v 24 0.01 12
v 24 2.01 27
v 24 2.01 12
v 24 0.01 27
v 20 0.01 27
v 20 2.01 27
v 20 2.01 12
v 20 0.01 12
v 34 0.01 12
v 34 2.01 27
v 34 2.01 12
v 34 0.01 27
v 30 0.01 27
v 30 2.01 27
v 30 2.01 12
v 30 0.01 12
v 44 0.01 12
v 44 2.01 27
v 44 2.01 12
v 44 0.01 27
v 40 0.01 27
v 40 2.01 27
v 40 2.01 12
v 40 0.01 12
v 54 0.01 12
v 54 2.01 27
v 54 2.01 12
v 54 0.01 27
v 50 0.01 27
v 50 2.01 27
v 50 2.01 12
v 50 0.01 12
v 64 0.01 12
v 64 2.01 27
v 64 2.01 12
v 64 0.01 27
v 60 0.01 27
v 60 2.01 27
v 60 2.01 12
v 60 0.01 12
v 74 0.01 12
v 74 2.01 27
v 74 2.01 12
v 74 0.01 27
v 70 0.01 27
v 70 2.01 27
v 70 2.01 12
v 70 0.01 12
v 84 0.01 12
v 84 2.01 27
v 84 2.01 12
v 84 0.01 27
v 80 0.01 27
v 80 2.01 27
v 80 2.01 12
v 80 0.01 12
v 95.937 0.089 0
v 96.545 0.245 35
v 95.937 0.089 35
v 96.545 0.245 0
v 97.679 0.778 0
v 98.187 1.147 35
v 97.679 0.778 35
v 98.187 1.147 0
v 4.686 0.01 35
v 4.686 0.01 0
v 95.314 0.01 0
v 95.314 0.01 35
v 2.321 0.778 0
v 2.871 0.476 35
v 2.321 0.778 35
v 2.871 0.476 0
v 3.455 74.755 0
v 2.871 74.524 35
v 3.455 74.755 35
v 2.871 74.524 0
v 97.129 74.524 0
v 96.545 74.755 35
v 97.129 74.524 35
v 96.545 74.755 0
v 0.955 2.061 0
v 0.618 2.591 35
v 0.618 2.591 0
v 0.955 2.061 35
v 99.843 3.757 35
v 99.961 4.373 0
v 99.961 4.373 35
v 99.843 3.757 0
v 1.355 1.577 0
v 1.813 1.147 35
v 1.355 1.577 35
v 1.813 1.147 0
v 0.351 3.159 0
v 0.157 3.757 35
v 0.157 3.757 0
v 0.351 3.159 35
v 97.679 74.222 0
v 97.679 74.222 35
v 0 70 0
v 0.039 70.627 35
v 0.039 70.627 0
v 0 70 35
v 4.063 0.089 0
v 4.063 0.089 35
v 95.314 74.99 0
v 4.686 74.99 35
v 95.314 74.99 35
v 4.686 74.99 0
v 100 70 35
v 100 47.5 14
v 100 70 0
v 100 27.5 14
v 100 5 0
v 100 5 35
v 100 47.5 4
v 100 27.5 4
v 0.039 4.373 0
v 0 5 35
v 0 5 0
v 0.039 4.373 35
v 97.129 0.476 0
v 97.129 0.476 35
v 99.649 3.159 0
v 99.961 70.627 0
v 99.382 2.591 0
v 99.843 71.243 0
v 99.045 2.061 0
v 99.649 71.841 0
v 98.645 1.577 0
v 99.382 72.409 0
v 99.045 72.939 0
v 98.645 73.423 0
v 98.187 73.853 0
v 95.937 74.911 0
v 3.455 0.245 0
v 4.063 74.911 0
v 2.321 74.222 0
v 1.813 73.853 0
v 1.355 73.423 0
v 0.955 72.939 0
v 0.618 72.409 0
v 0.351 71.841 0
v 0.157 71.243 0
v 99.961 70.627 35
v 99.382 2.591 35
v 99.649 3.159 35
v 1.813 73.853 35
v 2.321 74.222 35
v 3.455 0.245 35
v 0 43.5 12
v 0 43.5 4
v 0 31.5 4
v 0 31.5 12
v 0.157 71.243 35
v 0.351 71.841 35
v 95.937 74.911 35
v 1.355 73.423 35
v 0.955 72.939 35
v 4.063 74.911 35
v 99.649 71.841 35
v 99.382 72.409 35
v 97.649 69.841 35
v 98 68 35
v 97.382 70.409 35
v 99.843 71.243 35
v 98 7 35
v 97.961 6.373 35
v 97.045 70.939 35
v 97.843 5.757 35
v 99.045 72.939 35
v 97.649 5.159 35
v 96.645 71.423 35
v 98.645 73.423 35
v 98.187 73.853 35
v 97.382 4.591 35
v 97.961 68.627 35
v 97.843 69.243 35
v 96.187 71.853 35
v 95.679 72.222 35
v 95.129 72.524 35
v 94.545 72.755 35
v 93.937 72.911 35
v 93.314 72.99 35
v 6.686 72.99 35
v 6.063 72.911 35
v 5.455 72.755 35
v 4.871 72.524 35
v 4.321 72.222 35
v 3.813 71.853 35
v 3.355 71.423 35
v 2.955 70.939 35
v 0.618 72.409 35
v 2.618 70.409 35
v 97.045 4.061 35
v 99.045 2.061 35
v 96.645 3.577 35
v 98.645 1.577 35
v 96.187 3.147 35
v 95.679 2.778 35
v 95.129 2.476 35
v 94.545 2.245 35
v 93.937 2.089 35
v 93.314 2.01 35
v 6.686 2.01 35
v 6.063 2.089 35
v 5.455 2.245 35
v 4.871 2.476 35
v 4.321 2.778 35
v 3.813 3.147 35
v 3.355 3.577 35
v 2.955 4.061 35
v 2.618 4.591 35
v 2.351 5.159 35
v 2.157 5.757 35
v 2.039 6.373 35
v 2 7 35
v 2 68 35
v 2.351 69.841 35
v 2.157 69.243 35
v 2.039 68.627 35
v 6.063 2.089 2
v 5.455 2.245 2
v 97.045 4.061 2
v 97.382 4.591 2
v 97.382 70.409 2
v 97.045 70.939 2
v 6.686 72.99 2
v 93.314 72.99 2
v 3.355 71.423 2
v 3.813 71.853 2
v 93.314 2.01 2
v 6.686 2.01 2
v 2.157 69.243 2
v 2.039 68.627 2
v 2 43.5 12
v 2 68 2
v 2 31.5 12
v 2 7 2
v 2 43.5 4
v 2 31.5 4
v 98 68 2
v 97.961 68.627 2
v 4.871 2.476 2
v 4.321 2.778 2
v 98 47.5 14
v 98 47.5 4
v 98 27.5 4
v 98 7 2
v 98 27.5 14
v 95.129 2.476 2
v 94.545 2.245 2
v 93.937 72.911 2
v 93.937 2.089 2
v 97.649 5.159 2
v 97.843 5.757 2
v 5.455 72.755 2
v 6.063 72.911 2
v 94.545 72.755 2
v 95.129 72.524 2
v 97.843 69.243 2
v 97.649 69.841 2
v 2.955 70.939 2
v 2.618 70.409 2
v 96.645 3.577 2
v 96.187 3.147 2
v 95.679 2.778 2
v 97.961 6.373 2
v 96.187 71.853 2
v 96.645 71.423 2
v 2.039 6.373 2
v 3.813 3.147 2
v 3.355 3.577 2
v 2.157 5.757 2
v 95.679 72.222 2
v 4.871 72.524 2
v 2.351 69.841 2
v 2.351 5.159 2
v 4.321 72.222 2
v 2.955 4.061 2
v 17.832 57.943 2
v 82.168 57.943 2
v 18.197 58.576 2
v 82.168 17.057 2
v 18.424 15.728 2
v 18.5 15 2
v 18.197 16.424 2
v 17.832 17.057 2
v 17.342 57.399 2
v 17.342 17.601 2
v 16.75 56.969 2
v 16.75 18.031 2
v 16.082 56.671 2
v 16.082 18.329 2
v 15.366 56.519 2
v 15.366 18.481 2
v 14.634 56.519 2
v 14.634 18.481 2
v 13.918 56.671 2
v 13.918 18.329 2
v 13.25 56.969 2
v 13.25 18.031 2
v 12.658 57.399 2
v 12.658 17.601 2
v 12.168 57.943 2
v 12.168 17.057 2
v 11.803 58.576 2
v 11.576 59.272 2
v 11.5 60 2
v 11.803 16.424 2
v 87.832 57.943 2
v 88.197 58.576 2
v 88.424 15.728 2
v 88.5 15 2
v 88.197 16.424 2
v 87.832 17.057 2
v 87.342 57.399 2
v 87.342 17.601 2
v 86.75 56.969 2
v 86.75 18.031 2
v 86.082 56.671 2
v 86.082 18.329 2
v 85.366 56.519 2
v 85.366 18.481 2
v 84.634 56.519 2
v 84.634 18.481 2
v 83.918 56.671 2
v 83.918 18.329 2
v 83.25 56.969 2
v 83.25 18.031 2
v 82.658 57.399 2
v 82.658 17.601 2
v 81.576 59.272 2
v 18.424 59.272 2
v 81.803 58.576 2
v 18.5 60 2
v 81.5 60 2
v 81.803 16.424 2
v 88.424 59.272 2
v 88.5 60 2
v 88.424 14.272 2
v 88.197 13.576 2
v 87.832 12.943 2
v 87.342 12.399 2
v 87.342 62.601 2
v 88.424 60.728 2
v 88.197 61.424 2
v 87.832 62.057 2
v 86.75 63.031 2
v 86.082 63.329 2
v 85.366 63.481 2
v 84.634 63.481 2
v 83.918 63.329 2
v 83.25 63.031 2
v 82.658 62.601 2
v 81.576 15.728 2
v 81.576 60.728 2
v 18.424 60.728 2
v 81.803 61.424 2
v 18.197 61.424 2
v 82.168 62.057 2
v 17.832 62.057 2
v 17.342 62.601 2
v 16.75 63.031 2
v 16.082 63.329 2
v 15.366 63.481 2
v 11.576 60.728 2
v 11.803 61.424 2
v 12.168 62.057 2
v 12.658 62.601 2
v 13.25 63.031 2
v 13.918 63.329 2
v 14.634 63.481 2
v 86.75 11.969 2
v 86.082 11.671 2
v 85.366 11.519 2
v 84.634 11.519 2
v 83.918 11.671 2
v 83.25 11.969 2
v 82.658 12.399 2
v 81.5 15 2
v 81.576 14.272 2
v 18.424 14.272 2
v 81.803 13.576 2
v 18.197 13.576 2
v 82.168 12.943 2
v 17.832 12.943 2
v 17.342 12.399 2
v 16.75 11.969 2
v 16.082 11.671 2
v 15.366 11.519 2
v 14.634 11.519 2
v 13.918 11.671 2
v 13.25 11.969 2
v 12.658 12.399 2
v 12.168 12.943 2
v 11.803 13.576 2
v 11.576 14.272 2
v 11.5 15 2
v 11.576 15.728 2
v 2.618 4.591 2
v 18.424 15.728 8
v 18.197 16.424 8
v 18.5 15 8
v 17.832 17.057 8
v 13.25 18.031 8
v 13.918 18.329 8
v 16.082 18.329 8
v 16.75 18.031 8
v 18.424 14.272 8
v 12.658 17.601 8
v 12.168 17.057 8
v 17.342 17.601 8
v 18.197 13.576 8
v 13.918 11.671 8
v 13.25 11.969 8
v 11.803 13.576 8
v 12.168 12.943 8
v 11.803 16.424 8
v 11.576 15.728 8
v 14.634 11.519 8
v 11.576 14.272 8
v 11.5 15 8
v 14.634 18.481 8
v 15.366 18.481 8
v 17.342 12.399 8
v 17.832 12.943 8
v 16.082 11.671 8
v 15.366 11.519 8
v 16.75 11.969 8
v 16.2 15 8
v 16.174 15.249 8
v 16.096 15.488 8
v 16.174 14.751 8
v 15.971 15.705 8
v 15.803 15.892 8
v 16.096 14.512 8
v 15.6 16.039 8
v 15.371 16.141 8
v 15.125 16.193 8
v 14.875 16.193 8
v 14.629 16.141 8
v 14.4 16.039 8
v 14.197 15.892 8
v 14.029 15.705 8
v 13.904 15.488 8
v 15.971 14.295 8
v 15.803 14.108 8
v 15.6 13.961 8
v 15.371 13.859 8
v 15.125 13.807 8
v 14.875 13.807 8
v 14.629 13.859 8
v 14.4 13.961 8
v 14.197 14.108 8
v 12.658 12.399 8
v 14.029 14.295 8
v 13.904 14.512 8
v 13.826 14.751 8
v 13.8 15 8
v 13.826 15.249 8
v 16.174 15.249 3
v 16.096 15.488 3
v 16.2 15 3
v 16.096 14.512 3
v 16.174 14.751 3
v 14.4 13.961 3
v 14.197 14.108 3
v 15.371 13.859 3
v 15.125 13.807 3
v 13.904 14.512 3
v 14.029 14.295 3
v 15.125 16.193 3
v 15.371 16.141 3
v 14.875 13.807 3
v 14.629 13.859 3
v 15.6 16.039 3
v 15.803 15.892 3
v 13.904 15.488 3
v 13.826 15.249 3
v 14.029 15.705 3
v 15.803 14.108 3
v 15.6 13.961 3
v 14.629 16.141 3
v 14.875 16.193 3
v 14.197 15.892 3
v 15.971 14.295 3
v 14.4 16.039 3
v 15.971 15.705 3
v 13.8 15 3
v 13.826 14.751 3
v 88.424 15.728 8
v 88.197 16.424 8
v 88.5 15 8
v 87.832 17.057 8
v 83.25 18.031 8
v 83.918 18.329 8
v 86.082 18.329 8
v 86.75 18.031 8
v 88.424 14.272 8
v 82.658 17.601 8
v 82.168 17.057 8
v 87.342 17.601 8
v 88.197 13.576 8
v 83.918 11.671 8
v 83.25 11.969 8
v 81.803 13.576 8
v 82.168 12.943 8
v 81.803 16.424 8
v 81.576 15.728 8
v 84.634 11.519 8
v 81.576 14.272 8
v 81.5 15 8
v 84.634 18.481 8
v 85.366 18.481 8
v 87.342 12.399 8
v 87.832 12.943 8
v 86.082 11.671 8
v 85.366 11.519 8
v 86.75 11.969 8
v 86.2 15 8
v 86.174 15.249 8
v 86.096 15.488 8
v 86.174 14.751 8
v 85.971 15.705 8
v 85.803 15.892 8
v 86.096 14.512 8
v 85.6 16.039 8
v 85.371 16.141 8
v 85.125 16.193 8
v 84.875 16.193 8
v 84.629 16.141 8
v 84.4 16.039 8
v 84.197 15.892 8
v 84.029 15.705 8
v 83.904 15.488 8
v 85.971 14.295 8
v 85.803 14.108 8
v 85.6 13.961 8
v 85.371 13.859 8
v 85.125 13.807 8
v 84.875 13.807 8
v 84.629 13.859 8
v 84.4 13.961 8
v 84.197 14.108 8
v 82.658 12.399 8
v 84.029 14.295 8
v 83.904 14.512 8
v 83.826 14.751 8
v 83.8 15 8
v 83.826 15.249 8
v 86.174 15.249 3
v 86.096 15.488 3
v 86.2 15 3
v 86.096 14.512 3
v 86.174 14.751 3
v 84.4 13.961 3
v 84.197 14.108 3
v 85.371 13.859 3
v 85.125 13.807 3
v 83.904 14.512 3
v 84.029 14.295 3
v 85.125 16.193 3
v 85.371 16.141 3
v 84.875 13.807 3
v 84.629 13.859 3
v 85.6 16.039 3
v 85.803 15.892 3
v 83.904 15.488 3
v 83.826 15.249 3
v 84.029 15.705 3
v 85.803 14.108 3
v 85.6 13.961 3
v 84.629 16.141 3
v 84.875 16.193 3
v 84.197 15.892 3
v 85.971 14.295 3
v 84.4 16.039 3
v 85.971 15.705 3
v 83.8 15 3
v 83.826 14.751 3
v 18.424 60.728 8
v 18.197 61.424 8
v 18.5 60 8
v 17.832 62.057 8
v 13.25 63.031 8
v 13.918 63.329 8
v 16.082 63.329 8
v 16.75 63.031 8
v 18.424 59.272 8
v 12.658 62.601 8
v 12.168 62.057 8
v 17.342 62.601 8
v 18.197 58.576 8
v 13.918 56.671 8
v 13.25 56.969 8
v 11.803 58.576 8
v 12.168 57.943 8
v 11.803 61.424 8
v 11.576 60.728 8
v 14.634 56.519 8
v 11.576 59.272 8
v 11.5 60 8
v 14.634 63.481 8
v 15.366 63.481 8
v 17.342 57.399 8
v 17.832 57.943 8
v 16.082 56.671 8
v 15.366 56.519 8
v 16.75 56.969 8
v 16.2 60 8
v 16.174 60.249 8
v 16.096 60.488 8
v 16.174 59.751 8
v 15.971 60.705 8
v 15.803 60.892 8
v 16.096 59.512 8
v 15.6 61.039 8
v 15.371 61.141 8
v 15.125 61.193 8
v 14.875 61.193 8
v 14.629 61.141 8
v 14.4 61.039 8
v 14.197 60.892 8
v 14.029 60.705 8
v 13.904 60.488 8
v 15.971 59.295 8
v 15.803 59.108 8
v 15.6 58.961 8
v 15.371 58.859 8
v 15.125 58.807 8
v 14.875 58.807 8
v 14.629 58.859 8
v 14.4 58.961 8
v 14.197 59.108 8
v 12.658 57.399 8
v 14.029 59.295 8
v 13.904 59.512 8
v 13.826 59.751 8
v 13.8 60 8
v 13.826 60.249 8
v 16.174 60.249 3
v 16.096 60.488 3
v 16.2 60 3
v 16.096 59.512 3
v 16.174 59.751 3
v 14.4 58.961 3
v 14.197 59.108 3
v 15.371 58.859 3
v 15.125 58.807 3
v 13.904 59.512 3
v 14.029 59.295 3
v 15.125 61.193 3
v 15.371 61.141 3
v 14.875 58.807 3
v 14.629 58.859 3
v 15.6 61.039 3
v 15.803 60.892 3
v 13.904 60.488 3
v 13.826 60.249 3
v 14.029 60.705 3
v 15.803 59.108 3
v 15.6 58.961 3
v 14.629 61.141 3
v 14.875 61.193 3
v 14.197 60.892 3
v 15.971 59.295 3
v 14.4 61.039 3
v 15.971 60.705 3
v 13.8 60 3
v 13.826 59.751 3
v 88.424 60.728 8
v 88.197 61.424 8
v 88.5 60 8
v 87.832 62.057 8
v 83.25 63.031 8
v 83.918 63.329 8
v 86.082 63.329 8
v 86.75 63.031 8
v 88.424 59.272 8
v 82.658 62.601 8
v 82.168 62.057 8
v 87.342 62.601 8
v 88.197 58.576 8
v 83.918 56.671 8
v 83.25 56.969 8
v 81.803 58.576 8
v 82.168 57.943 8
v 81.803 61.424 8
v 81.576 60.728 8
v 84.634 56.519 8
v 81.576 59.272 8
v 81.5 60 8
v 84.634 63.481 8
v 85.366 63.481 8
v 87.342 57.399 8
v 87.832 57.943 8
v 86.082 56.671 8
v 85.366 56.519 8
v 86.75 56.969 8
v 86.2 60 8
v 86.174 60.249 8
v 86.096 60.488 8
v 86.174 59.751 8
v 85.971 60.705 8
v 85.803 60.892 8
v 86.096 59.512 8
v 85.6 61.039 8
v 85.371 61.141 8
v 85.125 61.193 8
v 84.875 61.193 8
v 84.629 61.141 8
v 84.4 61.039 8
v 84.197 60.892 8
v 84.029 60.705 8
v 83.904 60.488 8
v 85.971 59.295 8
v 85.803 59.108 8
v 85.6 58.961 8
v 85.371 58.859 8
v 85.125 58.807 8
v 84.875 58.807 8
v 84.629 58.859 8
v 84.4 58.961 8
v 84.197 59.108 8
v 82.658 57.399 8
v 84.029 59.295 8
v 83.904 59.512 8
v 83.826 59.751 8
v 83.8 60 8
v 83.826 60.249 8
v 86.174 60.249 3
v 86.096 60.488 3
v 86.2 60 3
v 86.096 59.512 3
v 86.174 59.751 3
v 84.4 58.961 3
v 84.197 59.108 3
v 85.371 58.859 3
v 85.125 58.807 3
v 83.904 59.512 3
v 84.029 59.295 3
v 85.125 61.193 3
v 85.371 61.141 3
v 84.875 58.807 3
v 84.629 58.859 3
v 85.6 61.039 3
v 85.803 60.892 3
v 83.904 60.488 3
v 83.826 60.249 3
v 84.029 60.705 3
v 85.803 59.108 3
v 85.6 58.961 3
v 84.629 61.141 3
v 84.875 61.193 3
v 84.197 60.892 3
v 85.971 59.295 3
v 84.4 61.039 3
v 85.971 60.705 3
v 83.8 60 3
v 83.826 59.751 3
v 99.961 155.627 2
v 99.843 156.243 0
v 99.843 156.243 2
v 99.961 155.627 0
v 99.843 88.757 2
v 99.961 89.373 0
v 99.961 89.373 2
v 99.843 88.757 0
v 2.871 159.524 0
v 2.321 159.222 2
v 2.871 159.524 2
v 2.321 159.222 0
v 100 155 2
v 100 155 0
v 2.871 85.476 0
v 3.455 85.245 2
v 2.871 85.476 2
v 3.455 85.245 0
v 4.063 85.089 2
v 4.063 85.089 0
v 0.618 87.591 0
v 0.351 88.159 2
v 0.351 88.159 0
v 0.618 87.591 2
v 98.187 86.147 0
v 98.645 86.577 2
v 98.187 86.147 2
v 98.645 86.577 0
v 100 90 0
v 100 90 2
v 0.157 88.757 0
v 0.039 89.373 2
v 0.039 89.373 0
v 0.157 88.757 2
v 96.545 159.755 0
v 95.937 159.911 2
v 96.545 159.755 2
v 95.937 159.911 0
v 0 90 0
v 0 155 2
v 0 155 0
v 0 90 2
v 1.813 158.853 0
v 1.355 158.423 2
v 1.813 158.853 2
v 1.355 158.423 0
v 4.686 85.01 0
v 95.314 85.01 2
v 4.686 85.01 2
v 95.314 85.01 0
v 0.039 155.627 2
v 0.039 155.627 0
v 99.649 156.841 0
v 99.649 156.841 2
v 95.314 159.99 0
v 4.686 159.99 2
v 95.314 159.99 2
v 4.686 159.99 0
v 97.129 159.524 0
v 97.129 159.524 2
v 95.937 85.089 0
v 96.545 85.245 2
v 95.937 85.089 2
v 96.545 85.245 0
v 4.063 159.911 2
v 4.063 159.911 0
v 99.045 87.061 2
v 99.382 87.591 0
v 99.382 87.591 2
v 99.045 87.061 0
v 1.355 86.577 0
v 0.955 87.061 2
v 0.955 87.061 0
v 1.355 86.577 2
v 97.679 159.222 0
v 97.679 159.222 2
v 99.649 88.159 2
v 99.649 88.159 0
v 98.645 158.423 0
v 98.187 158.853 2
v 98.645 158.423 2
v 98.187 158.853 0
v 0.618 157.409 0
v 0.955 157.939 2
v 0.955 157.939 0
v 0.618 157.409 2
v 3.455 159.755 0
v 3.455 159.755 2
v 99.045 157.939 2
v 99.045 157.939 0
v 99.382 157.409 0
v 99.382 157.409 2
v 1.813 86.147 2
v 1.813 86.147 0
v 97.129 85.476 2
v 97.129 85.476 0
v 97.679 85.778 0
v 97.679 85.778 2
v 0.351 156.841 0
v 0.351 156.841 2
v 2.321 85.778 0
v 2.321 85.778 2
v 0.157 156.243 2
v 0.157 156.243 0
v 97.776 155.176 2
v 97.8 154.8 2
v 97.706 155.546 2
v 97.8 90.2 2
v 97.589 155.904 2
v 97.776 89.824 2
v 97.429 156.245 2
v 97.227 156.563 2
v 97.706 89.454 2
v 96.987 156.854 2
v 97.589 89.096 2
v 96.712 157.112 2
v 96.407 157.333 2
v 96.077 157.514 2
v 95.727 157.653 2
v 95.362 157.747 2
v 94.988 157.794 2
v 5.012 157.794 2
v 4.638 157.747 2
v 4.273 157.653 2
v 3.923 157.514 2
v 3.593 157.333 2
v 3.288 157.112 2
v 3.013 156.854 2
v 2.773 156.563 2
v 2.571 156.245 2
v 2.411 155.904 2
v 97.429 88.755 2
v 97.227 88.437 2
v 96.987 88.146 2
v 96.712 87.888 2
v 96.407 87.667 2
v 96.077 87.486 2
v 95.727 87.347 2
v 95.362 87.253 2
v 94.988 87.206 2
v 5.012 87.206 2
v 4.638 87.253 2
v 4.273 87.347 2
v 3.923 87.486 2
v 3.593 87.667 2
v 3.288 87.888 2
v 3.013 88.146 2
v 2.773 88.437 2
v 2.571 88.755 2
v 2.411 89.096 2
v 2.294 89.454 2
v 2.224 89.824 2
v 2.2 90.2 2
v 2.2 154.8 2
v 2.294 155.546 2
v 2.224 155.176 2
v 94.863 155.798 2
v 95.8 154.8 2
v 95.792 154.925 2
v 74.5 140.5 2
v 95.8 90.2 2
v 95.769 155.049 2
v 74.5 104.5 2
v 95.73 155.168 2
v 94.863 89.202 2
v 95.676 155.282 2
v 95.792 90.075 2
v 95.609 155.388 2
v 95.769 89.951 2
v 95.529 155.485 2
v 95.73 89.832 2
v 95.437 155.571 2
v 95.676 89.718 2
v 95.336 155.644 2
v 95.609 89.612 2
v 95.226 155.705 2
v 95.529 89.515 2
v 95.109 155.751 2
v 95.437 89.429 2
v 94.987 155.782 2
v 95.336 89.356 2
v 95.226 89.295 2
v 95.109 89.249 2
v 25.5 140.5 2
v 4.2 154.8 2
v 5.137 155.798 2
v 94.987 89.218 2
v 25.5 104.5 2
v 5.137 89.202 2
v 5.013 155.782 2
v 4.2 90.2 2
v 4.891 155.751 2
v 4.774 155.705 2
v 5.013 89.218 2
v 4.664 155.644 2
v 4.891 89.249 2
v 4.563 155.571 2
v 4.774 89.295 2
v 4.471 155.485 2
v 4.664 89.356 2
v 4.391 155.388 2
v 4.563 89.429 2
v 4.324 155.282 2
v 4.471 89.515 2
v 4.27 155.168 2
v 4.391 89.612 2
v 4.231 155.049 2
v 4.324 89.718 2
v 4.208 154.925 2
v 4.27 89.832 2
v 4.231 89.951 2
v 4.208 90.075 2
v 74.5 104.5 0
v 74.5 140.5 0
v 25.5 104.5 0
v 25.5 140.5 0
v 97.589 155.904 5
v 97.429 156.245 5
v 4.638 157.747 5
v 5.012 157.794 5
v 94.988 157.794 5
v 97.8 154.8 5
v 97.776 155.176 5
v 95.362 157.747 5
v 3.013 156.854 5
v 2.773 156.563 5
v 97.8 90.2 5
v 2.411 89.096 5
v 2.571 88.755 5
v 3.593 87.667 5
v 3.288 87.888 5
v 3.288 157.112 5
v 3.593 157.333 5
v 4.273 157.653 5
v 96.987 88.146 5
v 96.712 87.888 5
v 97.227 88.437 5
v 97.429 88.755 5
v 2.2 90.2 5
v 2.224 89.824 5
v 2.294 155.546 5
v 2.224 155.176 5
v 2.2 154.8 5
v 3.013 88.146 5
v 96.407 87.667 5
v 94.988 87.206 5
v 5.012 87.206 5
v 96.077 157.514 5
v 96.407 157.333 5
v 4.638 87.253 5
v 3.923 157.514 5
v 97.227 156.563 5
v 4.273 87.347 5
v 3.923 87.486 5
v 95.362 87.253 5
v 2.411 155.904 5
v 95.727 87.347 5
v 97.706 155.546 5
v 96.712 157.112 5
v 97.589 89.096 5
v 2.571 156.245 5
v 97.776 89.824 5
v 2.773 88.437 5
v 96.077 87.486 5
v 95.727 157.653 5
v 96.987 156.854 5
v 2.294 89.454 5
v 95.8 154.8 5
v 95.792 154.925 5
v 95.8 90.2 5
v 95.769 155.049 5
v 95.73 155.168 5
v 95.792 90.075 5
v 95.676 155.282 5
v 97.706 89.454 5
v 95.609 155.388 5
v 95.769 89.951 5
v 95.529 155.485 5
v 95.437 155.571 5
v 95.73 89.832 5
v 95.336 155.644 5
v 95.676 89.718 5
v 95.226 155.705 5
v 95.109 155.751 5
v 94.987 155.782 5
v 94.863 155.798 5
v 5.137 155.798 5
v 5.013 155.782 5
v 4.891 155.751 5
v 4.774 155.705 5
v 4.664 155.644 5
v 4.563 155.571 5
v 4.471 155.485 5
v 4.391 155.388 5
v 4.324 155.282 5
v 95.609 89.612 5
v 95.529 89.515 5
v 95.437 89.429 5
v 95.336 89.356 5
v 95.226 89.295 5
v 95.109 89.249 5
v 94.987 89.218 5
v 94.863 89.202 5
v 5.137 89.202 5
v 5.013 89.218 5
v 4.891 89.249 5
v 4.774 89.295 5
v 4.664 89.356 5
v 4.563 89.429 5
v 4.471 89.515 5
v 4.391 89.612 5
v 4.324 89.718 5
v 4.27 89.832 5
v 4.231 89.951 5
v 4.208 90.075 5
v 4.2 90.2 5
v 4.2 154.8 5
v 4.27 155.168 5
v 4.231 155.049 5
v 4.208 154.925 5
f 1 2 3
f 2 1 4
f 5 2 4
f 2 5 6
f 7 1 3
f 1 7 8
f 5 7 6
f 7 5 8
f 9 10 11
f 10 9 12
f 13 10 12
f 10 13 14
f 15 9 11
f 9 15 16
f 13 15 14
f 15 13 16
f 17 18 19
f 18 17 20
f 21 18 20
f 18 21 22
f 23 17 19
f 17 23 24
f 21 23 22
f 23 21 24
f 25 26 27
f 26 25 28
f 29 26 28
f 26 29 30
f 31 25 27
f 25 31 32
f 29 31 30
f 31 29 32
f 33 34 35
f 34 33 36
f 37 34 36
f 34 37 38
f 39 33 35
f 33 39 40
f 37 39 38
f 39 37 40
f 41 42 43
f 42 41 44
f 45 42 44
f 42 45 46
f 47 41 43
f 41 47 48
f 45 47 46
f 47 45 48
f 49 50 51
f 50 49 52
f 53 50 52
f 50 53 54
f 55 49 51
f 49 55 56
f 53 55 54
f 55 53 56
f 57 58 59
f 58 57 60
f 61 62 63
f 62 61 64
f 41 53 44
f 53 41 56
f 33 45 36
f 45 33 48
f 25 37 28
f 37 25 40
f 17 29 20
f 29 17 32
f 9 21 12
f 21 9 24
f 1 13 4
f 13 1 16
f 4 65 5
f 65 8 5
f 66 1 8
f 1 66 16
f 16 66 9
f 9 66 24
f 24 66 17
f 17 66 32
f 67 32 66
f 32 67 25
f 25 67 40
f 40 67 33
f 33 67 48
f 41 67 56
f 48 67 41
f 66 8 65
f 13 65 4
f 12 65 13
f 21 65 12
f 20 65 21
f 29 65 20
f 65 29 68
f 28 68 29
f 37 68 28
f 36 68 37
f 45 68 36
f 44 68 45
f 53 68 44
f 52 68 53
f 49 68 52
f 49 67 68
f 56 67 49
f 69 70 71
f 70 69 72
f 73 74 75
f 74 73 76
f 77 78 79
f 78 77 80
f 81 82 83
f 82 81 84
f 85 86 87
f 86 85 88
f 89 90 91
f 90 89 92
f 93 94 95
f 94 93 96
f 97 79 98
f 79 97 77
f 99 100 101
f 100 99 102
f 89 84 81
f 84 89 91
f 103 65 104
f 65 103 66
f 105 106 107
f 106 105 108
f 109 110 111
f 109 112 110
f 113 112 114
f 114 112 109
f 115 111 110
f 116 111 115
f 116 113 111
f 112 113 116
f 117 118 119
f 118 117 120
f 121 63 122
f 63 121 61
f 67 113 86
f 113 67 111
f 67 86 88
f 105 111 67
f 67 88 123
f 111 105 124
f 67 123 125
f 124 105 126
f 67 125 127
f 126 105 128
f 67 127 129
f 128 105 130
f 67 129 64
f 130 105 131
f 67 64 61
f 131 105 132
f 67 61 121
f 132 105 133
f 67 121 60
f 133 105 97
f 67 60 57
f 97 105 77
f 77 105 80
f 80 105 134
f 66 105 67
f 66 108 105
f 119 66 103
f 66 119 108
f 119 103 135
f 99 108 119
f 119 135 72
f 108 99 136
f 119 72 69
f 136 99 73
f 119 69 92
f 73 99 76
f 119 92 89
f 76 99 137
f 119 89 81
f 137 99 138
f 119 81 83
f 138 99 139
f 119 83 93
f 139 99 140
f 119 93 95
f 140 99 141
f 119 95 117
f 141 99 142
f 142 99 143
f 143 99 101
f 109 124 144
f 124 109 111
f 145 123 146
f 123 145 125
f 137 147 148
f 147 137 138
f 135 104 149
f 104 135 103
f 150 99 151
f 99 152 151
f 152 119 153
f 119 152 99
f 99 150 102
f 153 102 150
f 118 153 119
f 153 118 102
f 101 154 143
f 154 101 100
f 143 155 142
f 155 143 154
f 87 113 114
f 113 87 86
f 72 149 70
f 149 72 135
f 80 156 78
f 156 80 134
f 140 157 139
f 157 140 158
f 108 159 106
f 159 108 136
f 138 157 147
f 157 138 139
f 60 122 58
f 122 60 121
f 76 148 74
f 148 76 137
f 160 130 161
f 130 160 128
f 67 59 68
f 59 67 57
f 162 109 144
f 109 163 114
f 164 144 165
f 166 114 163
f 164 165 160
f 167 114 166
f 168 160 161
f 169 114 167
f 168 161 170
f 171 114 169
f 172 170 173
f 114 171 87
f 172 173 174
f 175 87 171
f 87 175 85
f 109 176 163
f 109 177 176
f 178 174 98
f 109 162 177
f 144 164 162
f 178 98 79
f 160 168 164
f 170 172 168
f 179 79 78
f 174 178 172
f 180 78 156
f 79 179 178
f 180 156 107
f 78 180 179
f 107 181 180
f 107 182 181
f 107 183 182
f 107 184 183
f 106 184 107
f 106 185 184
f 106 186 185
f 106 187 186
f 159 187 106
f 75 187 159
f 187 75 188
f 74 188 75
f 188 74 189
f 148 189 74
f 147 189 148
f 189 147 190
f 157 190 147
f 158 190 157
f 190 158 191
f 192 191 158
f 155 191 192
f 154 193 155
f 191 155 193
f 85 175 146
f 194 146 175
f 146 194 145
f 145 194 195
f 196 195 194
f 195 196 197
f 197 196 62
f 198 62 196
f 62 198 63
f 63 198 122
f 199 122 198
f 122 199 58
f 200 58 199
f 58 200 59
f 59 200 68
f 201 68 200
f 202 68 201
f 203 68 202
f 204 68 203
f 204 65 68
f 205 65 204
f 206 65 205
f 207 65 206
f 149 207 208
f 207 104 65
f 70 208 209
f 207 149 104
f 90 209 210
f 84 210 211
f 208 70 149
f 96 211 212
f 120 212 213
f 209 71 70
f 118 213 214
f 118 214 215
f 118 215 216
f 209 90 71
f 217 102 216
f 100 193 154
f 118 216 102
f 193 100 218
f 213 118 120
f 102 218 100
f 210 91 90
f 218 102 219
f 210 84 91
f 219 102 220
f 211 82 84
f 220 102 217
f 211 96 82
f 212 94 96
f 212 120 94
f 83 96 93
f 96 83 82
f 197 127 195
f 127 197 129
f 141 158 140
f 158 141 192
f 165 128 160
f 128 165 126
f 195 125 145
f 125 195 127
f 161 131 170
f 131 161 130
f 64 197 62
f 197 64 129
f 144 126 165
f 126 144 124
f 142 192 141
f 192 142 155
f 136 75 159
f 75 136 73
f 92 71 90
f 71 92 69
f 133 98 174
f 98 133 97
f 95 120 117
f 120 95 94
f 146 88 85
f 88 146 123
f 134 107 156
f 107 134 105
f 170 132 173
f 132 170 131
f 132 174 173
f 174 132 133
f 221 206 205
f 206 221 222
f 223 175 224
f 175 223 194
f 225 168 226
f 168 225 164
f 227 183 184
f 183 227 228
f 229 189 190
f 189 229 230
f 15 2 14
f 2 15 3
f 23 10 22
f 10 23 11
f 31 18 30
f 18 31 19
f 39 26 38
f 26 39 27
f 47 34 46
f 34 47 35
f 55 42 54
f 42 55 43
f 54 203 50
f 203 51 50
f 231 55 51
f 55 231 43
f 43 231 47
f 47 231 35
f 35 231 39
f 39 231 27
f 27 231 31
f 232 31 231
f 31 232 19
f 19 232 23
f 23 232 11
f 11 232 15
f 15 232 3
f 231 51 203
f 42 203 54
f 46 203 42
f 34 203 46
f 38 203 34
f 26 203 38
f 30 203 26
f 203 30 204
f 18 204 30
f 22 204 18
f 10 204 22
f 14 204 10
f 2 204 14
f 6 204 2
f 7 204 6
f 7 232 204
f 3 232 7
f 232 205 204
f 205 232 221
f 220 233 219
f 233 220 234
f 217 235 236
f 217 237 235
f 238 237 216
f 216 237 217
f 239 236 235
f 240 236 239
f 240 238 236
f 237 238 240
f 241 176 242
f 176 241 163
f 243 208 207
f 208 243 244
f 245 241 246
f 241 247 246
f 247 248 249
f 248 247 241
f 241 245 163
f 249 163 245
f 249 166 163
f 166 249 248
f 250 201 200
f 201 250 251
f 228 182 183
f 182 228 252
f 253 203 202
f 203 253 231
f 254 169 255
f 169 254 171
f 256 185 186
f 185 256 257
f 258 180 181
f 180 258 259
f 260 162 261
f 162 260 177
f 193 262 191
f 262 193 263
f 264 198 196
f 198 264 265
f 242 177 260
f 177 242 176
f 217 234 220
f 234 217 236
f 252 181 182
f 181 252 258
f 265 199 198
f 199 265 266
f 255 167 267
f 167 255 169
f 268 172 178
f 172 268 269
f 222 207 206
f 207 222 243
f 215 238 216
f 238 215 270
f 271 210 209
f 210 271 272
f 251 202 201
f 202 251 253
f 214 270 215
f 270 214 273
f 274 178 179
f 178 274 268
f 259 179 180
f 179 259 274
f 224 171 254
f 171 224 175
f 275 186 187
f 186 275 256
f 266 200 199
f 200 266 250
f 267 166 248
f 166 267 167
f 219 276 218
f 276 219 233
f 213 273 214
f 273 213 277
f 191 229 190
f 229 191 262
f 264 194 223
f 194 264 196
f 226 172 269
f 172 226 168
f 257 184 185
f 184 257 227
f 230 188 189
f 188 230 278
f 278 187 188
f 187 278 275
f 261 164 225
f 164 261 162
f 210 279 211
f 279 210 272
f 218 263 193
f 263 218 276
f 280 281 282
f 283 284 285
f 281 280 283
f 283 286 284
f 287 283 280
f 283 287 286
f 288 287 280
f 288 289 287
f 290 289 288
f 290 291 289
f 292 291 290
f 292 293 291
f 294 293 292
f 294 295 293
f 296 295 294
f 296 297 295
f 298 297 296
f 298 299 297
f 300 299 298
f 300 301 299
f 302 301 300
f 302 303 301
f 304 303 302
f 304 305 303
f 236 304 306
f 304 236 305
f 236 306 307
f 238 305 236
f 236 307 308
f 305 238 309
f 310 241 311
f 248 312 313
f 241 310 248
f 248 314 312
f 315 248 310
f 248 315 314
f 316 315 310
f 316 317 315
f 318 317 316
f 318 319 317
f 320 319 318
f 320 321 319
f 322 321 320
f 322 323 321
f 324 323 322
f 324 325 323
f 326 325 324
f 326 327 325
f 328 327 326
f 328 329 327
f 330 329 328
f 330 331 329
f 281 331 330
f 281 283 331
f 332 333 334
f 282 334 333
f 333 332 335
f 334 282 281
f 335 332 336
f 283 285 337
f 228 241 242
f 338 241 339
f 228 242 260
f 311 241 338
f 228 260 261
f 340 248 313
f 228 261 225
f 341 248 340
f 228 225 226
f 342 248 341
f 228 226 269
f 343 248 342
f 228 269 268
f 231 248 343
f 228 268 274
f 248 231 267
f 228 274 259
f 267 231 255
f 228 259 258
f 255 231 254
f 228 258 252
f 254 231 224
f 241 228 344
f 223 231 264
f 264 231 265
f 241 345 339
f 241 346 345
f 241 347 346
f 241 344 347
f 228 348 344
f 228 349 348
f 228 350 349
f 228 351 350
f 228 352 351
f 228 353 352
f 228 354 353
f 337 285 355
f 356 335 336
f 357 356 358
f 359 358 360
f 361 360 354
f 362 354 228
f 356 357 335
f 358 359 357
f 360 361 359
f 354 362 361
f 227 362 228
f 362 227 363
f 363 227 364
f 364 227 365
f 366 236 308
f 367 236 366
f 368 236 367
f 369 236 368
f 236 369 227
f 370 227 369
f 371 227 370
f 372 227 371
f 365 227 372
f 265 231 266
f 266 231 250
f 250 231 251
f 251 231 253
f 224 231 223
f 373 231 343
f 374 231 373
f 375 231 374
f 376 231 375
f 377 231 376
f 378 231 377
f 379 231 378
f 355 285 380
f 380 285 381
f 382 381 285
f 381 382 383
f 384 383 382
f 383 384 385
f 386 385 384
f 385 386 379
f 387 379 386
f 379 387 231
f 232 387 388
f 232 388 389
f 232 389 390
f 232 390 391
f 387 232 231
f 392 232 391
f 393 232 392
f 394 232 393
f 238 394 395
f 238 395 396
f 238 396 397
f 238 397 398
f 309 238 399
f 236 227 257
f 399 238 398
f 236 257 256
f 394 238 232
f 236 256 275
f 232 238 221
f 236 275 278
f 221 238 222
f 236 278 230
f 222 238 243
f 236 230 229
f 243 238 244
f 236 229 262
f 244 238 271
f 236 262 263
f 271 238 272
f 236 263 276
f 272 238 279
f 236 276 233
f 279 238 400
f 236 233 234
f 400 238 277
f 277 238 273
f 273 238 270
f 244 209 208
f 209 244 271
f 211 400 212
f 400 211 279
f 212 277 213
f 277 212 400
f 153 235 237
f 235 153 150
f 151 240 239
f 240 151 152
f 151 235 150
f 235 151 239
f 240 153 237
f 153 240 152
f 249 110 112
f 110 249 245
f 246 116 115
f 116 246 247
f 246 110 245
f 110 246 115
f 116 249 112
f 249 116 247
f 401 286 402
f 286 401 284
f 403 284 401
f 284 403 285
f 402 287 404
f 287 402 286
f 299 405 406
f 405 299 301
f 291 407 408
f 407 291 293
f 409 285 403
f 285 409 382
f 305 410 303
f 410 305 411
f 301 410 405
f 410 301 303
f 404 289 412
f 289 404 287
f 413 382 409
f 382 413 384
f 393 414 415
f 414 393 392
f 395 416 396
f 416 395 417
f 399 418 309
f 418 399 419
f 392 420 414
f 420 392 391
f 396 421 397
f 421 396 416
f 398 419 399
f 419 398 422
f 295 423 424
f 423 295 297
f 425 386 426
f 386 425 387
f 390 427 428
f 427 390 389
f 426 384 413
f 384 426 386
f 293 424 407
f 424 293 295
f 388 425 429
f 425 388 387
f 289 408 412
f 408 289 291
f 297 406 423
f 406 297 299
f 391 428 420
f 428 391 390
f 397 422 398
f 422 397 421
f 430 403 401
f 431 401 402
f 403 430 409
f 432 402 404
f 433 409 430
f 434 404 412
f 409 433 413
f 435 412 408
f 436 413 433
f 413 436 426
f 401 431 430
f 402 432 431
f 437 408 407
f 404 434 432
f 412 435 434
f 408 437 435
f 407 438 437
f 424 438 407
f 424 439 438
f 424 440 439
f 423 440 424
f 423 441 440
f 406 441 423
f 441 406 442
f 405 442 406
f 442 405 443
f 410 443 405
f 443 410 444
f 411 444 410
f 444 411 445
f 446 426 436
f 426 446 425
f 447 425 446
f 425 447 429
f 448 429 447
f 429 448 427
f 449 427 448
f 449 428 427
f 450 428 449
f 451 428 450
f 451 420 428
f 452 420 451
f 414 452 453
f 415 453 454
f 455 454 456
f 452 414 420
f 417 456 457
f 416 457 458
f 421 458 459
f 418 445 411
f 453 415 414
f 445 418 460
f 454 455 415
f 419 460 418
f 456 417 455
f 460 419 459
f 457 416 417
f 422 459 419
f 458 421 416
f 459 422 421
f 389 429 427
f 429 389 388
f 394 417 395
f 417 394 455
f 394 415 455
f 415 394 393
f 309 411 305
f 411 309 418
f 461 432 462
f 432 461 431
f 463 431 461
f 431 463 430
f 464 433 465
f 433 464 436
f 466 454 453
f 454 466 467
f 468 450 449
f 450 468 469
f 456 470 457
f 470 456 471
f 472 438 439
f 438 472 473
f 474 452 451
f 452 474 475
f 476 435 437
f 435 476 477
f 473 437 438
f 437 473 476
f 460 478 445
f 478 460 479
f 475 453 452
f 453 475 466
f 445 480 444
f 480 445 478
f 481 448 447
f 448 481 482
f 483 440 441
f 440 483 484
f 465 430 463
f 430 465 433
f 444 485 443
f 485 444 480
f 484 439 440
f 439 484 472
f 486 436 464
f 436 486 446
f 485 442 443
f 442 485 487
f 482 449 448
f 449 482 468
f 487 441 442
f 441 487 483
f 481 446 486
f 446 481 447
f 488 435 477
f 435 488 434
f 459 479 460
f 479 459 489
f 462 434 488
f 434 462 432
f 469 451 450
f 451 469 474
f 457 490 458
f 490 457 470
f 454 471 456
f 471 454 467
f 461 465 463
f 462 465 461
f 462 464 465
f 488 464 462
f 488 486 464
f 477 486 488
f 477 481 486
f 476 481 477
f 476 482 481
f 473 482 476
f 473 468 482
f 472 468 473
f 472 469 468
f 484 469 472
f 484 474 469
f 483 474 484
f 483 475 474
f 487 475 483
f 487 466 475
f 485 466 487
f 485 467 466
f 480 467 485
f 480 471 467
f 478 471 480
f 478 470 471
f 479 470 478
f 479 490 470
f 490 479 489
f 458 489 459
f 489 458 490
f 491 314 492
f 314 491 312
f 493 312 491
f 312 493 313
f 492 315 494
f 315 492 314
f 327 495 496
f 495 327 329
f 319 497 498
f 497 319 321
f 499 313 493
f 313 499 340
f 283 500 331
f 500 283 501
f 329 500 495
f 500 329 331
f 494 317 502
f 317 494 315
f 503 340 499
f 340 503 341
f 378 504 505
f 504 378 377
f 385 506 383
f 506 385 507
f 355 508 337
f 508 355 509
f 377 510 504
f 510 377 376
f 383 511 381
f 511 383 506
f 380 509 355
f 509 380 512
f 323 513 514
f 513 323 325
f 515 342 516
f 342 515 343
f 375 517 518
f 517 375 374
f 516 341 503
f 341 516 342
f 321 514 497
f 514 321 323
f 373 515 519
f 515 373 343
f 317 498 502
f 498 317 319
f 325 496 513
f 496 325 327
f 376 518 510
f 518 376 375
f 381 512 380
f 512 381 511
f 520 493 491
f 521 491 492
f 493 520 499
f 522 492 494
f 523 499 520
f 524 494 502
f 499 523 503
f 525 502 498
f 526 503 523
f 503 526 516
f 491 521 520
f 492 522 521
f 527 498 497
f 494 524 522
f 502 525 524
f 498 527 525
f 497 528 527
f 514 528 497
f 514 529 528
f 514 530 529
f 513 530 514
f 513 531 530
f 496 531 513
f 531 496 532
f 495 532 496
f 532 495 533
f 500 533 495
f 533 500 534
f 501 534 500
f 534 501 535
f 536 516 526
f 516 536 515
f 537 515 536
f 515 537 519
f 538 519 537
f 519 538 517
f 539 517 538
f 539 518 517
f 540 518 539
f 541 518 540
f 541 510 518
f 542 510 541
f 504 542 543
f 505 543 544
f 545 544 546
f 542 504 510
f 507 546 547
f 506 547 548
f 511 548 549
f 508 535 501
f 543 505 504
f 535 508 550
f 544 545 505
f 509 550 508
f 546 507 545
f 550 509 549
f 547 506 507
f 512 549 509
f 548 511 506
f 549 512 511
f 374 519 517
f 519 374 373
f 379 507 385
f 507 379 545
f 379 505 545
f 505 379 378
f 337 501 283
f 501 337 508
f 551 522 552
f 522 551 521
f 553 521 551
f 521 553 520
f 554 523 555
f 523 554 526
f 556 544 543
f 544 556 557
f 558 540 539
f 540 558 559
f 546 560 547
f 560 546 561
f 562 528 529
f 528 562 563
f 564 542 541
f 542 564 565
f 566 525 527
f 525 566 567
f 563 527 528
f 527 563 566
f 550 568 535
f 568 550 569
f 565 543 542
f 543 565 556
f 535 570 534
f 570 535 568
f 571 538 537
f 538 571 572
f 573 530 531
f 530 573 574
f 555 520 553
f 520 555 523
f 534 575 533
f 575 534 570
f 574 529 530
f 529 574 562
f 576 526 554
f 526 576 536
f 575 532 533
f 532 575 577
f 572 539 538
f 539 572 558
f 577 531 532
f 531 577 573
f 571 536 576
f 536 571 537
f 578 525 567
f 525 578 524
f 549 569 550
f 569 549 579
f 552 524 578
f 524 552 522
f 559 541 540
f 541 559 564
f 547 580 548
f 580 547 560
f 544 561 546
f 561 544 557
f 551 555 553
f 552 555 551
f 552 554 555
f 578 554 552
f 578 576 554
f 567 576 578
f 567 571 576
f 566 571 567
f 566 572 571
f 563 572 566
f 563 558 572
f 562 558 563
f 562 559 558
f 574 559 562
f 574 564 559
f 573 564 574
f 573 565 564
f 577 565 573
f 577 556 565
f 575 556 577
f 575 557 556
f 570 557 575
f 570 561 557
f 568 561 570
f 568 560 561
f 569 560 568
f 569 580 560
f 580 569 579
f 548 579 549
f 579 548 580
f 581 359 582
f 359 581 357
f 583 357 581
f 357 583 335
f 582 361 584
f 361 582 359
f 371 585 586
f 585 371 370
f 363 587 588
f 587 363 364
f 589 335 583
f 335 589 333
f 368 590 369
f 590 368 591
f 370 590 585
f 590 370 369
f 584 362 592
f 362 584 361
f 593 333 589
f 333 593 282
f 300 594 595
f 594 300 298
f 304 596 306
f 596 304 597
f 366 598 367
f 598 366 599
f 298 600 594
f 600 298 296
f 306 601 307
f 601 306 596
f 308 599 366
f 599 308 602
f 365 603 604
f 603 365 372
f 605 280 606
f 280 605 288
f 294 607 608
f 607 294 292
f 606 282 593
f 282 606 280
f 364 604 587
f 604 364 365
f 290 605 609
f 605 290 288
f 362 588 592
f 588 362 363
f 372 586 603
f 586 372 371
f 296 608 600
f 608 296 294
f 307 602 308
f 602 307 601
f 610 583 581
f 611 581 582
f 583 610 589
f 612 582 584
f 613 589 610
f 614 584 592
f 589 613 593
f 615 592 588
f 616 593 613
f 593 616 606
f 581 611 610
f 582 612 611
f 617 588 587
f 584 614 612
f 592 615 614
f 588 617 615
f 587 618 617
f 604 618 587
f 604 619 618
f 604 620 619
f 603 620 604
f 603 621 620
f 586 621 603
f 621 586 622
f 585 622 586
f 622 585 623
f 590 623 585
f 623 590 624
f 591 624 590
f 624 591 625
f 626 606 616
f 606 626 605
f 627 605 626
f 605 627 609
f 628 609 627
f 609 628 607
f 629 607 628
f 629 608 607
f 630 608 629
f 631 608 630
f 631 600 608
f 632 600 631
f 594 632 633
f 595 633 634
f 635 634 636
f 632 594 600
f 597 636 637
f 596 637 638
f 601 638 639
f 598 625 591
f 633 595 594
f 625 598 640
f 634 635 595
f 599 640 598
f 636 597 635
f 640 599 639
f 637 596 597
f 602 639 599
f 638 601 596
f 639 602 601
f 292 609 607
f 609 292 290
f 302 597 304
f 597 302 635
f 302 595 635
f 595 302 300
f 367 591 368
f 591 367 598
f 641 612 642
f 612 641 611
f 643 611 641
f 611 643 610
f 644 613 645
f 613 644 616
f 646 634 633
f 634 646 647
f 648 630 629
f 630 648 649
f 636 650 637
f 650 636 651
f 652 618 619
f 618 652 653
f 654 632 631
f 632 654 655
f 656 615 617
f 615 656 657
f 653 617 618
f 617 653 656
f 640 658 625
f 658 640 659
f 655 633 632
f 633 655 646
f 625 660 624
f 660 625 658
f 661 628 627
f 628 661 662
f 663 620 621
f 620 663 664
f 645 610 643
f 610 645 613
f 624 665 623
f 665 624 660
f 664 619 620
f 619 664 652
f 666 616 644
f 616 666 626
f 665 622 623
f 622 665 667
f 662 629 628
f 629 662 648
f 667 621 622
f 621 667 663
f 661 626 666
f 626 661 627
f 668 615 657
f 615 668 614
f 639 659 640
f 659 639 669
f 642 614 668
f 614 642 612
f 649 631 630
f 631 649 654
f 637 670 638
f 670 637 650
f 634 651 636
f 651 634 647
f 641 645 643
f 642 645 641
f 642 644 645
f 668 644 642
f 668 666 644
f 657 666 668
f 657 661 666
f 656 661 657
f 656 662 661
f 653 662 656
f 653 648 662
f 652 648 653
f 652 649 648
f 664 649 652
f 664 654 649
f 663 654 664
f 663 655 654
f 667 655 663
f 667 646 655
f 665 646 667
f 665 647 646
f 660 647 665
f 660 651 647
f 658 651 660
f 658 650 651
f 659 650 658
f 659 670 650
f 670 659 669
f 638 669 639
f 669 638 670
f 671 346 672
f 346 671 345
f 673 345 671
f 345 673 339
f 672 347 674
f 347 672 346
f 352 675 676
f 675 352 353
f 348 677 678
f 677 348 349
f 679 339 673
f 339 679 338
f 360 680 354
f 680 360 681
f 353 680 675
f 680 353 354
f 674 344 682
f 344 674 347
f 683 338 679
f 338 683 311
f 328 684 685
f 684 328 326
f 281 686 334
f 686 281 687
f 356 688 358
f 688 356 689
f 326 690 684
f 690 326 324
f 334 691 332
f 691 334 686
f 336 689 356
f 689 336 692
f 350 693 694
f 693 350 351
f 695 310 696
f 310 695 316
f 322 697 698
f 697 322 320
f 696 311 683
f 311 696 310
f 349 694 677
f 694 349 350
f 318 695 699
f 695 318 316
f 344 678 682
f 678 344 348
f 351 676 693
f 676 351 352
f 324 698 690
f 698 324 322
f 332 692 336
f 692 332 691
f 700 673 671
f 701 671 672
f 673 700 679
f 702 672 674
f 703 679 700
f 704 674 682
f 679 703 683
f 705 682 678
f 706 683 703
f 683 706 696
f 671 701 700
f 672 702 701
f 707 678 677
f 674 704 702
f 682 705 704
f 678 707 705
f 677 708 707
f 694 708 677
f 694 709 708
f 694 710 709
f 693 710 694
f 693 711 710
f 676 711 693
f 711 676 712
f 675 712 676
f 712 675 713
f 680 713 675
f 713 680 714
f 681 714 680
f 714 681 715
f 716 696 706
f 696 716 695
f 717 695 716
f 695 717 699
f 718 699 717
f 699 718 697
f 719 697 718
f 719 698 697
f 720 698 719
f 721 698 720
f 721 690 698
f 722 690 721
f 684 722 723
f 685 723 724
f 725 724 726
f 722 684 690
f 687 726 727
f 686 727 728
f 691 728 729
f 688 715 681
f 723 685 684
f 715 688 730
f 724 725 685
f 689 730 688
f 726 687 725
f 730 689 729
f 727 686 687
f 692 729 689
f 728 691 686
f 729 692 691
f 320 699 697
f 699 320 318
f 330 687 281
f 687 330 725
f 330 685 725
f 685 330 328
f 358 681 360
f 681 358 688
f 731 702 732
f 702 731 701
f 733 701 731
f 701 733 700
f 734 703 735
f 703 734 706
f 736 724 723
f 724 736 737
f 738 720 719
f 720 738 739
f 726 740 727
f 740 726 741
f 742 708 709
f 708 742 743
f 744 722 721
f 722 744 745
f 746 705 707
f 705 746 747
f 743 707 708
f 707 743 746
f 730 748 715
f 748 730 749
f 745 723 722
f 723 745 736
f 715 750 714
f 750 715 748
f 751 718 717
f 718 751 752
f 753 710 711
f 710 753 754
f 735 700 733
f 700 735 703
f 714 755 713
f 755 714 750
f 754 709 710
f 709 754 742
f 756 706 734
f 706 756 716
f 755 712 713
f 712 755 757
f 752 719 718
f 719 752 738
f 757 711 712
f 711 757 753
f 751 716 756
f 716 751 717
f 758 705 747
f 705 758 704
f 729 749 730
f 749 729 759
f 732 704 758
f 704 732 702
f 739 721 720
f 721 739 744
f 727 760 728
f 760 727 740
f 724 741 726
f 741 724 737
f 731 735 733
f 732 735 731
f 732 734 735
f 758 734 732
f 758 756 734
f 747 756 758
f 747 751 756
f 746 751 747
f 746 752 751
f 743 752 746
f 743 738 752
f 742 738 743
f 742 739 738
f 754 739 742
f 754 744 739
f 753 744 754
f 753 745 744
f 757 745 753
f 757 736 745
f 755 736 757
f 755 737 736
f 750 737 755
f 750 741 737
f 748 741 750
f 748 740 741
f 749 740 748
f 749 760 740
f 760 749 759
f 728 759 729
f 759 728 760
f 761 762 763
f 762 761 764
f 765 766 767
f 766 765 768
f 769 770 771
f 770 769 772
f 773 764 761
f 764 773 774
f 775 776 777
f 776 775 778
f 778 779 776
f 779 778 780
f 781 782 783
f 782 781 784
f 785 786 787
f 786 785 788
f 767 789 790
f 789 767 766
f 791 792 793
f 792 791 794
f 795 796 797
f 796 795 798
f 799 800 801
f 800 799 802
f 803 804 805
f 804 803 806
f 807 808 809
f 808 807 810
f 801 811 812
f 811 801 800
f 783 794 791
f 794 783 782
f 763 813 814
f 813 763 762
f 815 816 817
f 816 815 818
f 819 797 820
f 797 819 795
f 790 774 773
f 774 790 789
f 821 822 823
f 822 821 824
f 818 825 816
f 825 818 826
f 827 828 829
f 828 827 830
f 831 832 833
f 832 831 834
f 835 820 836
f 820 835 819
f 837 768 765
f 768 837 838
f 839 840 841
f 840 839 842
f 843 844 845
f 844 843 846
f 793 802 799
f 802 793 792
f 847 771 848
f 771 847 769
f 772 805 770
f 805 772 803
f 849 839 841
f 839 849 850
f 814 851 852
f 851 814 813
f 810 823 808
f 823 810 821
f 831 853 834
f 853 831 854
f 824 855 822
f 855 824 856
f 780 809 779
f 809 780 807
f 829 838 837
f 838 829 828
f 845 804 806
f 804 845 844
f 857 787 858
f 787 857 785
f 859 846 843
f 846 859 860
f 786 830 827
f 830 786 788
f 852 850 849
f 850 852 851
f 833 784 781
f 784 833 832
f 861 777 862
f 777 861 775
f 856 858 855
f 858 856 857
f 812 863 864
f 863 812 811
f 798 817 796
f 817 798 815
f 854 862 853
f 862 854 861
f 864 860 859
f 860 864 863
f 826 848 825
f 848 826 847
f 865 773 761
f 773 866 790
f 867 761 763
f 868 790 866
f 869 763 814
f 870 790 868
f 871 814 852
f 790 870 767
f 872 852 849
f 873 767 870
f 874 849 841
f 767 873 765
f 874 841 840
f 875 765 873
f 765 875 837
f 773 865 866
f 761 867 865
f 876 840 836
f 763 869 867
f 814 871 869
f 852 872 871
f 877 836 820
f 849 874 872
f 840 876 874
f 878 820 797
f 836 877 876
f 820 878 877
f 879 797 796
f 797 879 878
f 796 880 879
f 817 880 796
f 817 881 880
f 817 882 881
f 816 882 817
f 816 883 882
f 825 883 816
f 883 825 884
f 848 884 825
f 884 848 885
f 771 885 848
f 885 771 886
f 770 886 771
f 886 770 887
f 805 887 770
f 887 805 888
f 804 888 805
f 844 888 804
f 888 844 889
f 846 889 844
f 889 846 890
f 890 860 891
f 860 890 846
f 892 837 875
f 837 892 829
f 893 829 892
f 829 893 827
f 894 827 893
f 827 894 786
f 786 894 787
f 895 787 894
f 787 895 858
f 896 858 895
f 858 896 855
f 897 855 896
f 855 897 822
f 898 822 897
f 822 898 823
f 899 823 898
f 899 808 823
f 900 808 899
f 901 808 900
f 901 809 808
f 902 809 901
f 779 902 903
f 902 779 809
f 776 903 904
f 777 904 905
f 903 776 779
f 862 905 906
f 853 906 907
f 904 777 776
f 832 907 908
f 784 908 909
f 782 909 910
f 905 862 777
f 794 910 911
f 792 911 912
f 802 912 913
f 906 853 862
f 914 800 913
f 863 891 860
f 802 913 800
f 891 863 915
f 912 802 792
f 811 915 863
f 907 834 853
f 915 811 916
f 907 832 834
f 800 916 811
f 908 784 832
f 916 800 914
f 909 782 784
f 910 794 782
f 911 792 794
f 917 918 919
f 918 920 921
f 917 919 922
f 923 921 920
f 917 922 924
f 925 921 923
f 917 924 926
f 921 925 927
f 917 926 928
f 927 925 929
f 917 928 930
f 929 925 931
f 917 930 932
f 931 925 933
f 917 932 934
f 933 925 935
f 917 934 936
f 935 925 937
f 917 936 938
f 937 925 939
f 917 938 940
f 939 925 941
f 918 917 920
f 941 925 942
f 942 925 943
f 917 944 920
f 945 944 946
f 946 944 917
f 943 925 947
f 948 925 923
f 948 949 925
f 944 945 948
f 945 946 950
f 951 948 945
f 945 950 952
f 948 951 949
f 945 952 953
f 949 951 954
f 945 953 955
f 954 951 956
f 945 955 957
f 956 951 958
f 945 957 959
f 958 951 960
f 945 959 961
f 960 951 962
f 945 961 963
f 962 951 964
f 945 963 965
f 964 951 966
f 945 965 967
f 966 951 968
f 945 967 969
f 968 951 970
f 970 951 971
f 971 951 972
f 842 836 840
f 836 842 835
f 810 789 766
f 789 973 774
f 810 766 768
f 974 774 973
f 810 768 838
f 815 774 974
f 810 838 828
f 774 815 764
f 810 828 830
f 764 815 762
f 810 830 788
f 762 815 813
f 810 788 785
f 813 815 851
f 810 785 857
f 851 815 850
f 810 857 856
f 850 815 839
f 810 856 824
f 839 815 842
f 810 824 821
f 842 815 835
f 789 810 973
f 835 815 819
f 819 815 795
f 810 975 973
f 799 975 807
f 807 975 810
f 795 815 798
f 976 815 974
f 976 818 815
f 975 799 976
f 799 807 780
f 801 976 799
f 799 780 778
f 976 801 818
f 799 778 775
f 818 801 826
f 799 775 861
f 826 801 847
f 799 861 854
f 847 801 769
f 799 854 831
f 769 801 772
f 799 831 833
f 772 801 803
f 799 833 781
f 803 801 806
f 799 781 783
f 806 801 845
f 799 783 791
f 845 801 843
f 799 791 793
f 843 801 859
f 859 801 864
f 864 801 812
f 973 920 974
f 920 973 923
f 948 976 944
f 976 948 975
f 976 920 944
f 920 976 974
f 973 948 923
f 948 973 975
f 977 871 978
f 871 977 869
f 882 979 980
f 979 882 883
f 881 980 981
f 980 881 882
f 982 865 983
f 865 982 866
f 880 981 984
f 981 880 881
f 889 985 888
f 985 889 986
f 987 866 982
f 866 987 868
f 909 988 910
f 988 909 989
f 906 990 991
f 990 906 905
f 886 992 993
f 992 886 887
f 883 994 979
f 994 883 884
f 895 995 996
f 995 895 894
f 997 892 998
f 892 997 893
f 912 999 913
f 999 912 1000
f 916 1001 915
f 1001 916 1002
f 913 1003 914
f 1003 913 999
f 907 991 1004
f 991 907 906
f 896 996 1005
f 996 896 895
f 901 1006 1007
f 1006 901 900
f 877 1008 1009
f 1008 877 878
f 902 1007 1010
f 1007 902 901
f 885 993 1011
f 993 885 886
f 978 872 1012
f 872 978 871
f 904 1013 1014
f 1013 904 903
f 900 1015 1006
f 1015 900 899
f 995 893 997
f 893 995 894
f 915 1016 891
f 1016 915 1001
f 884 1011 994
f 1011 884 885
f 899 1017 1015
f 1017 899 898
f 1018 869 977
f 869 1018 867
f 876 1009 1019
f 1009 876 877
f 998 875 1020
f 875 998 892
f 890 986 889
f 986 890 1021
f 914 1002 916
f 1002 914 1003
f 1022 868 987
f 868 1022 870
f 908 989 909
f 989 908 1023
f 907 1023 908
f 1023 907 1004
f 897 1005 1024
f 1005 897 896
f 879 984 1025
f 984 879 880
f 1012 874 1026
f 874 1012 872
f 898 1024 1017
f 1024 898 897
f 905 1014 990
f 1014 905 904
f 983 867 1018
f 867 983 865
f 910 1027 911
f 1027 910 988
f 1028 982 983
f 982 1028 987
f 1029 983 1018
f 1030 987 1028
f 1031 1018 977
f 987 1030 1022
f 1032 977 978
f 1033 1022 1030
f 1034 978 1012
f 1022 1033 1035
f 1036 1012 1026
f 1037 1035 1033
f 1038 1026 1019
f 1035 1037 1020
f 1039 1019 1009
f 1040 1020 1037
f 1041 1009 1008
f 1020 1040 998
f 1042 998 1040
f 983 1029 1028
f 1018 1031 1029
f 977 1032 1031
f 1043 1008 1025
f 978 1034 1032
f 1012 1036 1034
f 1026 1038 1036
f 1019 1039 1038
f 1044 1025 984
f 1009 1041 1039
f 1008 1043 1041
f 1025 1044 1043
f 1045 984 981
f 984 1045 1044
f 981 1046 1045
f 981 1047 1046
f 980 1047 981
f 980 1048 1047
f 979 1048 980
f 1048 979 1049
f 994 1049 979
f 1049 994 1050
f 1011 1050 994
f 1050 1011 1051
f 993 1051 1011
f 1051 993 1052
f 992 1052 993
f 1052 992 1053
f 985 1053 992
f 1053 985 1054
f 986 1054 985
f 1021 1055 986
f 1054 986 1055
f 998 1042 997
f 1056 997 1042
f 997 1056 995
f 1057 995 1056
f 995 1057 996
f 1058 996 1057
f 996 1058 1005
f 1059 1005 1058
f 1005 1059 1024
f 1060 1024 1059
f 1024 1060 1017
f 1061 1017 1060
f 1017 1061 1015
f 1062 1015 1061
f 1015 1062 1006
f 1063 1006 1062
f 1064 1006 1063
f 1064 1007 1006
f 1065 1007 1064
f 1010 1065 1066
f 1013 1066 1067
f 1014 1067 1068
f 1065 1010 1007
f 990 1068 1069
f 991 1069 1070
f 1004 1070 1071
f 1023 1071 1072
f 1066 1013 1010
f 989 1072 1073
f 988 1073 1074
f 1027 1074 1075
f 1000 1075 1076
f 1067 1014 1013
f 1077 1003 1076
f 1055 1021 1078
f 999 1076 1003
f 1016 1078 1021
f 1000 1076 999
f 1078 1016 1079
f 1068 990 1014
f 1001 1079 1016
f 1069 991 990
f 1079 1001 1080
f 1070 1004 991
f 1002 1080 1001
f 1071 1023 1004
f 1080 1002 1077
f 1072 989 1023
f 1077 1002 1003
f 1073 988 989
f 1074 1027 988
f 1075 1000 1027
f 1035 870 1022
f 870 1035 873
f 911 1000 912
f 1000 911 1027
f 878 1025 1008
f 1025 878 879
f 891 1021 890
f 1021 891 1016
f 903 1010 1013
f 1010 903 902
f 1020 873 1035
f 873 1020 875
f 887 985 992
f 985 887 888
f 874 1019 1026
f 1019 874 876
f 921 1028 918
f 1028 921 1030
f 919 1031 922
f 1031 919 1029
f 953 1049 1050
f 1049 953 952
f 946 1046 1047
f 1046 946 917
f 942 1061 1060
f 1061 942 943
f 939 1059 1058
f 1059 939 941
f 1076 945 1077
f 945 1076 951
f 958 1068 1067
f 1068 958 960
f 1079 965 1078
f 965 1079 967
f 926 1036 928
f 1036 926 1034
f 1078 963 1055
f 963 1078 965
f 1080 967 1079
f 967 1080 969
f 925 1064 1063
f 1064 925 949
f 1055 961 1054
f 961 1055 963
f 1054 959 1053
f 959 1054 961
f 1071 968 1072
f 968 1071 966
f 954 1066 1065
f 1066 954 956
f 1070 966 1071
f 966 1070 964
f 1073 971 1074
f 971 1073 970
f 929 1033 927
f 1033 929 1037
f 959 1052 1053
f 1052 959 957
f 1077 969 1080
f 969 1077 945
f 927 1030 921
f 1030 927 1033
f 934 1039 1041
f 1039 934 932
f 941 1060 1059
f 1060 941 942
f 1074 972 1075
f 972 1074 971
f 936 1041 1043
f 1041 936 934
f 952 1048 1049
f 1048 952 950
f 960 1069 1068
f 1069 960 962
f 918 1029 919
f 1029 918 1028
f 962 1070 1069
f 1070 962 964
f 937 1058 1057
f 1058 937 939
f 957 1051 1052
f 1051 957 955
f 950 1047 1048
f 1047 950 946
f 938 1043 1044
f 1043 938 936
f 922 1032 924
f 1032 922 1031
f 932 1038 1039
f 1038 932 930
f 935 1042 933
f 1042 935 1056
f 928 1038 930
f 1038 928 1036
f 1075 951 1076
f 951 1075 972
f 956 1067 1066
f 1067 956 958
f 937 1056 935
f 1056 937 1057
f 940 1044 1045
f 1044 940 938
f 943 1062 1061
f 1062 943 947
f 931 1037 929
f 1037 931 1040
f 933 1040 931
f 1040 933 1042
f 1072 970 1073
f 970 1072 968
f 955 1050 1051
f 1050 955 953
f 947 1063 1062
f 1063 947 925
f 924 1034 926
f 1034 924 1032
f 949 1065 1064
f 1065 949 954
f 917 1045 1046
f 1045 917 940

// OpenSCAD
// Vigilante Telemetry Hub Enclosure
// This script is for OpenSCAD (a free 3D modeling software).
// Simply download OpenSCAD, paste this code, and click "Render" to export an STL for 3D printing!
// Units: millimeters

length = 100;
width = 75;
height = 35;
wall = 2;
corner_radius = 5;

module rounded_box(l, w, h, r) {
    hull() {
        translate([r, r, 0]) cylinder(r=r, h=h, $fn=50);
        translate([l-r, r, 0]) cylinder(r=r, h=h, $fn=50);
        translate([r, w-r, 0]) cylinder(r=r, h=h, $fn=50);
        translate([l-r, w-r, 0]) cylinder(r=r, h=h, $fn=50);
    }
}

module base_shell() {
    difference() {
        // Outer shell
        rounded_box(length, width, height, corner_radius);
        
        // Inner hollow (carving out the inside)
        translate([wall, wall, wall])
            rounded_box(length-2*wall, width-2*wall, height, corner_radius);
            
        // Cutout for ESP32 USB Port (Left side)
        translate([-1, width/2 - 6, wall + 2])
            cube([wall+2, 12, 8]);
            
        // Cutout for OBD-II Cable and Sensor Wires (Right side)
        translate([length - wall - 1, width/2 - 10, wall + 2])
            cube([wall+2, 20, 10]);
            
        // Ventilation slots (Front side)
        for (i = [20 : 10 : length-20]) {
            translate([i, -1, wall + 10])
                cube([4, wall+2, 15]);
        }
    }
}

module lid() {
    difference() {
        // Lid base plate
        rounded_box(length, width, wall, corner_radius);
        
        // Cutout for 2.4" TFT Display (Active viewing area ~ 49x36)
        translate([(length - 49)/2, (width - 36)/2, -1])
            cube([49, 36, wall + 2]);
    }
    
    // Inner lip for a snap/friction fit into the base
    translate([wall + 0.2, wall + 0.2, wall])
        difference() {
            rounded_box(length - 2*wall - 0.4, width - 2*wall - 0.4, 3, corner_radius - wall);
            translate([wall, wall, -1])
                rounded_box(length - 4*wall - 0.4, width - 4*wall - 0.4, 5, corner_radius - 2*wall);
        }
}

module standoffs() {
    // 4 standoffs for mounting a generic proto-board or the ESP32
    // Sized for M2.5 or M3 self-tapping screws
    positions = [
        [15, 15, wall],
        [length - 15, 15, wall],
        [15, width - 15, wall],
        [length - 15, width - 15, wall]
    ];
    
    for (p = positions) {
        translate(p)
            difference() {
                cylinder(r=3.5, h=6, $fn=30); // Standoff pillar
                translate([0,0,1]) cylinder(r=1.2, h=6, $fn=30); // Screw hole
            }
    }
}

// ----------------------------------------------------
// RENDER COMMANDS
// ----------------------------------------------------

// 1. Render the Base Shell and Standoffs
base_shell();
standoffs();

// 2. Render the Lid (Shifted to the side so both print flat on the build plate)
translate([0, width + 10, 0])
    lid();
